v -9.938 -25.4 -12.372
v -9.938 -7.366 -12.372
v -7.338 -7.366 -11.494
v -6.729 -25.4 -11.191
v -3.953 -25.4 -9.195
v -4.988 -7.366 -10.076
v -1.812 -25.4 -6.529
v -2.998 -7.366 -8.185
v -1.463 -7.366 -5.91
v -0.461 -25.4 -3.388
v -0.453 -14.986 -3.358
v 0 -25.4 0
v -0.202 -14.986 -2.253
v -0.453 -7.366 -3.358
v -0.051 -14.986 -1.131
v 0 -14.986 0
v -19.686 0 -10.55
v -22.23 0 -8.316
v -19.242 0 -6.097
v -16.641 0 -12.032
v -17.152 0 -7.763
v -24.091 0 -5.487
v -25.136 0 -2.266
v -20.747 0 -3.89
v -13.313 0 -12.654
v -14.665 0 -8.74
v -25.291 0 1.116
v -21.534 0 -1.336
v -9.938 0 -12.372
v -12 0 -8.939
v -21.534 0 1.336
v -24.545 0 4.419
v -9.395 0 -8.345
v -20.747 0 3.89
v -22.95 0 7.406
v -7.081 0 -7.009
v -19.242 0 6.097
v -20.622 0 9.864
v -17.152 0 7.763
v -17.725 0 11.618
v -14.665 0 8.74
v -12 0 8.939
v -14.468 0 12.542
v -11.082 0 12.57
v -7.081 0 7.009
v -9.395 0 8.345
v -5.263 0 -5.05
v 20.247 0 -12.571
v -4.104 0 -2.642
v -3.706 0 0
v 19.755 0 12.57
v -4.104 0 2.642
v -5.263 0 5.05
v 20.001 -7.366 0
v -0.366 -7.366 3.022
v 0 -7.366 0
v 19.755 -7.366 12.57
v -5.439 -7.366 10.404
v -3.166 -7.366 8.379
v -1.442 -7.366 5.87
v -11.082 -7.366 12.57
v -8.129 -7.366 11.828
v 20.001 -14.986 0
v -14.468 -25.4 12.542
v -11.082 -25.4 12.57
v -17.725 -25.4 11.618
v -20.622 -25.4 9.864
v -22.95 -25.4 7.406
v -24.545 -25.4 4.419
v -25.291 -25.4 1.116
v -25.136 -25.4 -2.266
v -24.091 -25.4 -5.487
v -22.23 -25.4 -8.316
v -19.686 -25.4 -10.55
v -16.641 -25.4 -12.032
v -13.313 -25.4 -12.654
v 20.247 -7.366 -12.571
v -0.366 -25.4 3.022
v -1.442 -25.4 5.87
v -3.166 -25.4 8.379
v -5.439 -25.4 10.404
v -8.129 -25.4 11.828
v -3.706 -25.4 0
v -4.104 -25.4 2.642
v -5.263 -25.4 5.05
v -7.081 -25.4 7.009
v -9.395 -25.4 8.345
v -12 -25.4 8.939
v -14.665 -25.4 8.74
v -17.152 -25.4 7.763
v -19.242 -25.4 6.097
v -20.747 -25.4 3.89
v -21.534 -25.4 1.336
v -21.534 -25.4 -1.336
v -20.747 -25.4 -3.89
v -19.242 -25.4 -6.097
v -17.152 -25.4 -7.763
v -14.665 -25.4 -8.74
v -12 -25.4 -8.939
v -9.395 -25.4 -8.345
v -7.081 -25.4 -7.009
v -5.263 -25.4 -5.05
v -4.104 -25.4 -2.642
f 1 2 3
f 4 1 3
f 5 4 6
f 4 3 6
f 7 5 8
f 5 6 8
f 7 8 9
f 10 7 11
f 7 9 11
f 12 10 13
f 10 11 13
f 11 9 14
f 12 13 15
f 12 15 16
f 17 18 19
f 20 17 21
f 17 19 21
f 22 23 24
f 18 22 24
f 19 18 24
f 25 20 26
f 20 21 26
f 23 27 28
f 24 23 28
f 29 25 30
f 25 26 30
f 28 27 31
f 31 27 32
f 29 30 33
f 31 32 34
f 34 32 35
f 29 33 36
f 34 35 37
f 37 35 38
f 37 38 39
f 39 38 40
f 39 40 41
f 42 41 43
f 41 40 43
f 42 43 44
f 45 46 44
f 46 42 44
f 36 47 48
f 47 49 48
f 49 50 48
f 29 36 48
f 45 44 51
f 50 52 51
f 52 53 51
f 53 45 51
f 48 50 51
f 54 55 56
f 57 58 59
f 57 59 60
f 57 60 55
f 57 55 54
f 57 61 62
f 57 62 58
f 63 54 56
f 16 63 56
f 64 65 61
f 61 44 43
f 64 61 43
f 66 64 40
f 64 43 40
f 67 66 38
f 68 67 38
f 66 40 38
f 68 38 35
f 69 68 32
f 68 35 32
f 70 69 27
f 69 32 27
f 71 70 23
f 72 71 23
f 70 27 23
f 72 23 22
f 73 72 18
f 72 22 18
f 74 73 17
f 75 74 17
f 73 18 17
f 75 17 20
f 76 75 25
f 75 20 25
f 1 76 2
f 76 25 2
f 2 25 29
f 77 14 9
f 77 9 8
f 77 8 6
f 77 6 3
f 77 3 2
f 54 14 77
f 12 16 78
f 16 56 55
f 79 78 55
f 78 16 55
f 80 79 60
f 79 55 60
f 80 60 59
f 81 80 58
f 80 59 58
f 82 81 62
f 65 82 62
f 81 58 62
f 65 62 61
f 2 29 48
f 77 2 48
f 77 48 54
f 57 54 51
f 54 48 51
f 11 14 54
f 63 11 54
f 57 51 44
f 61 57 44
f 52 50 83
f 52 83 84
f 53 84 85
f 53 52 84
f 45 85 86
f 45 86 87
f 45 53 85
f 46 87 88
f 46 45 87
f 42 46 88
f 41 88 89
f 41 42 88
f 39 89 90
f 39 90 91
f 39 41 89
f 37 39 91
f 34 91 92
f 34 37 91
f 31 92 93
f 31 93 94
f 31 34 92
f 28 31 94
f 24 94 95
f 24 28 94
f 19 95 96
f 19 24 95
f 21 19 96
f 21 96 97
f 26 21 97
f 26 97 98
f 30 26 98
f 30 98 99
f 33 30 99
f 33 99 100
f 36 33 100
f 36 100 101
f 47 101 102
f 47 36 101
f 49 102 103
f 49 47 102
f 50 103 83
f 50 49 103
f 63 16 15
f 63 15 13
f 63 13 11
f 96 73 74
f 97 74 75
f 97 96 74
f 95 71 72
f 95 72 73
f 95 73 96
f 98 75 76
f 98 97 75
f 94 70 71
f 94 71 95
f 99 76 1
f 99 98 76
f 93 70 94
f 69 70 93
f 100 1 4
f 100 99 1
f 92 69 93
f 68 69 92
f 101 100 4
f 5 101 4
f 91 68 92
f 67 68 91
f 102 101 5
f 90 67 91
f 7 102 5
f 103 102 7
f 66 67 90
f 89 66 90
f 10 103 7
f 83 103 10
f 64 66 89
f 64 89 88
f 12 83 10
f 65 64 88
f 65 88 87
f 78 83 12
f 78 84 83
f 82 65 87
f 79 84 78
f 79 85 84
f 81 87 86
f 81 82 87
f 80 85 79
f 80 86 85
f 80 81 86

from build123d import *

# Parameters (mm, degrees)
F0_R     = 8.964433
F1_DEPTH = 25.4
F2_DEPTH = 7.366
F4_DEPTH = 7.62


with BuildPart() as f1:
    # F0 (on Front) → F1 (new body)
    with BuildSketch(Plane.XZ):
        with BuildLine():
            ThreePointArc((-9.938305, -12.372125), (-2.792256, -7.934724), (0, 0))
            ThreePointArc((0, 0), (-3.165972, 8.378736), (-11.081682, 12.570171))
            ThreePointArc((-11.081682, 12.570171), (-25.326984, -0.580201), (-9.938305, -12.372125))
        make_face()
        with Locations((-12.670138, 0)):
            Circle(F0_R, mode=Mode.SUBTRACT)
    extrude(amount=F1_DEPTH)

    # F0 (on Front) → F2 (join)
    with BuildSketch(Plane.XZ):
        with BuildLine():
            ThreePointArc((-11.081682, 12.570171), (-3.165972, 8.378736), (0, 0))
            ThreePointArc((0, 0), (-2.792256, -7.934724), (-9.938305, -12.372125))
            Line((-9.938305, -12.372125), (20.246768, -12.57116))
            Line((20.246768, -12.57116), (19.755474, 12.570171))
            Line((19.755474, 12.570171), (-11.081682, 12.570171))
        make_face()
    extrude(amount=F2_DEPTH)

    # F3 (on face) → F4 (join)
    with BuildSketch(Plane.XZ.offset(7.366)):
        with BuildLine():
            Line((-0.452979, -3.357592), (20.001121, -0.000494))
            Line((20.001121, -0.000494), (0, 0))
            ThreePointArc((0, 0), (-0.113755, -1.694005), (-0.452979, -3.357592))
        make_face()
    extrude(amount=F4_DEPTH)


solid = f1.part
